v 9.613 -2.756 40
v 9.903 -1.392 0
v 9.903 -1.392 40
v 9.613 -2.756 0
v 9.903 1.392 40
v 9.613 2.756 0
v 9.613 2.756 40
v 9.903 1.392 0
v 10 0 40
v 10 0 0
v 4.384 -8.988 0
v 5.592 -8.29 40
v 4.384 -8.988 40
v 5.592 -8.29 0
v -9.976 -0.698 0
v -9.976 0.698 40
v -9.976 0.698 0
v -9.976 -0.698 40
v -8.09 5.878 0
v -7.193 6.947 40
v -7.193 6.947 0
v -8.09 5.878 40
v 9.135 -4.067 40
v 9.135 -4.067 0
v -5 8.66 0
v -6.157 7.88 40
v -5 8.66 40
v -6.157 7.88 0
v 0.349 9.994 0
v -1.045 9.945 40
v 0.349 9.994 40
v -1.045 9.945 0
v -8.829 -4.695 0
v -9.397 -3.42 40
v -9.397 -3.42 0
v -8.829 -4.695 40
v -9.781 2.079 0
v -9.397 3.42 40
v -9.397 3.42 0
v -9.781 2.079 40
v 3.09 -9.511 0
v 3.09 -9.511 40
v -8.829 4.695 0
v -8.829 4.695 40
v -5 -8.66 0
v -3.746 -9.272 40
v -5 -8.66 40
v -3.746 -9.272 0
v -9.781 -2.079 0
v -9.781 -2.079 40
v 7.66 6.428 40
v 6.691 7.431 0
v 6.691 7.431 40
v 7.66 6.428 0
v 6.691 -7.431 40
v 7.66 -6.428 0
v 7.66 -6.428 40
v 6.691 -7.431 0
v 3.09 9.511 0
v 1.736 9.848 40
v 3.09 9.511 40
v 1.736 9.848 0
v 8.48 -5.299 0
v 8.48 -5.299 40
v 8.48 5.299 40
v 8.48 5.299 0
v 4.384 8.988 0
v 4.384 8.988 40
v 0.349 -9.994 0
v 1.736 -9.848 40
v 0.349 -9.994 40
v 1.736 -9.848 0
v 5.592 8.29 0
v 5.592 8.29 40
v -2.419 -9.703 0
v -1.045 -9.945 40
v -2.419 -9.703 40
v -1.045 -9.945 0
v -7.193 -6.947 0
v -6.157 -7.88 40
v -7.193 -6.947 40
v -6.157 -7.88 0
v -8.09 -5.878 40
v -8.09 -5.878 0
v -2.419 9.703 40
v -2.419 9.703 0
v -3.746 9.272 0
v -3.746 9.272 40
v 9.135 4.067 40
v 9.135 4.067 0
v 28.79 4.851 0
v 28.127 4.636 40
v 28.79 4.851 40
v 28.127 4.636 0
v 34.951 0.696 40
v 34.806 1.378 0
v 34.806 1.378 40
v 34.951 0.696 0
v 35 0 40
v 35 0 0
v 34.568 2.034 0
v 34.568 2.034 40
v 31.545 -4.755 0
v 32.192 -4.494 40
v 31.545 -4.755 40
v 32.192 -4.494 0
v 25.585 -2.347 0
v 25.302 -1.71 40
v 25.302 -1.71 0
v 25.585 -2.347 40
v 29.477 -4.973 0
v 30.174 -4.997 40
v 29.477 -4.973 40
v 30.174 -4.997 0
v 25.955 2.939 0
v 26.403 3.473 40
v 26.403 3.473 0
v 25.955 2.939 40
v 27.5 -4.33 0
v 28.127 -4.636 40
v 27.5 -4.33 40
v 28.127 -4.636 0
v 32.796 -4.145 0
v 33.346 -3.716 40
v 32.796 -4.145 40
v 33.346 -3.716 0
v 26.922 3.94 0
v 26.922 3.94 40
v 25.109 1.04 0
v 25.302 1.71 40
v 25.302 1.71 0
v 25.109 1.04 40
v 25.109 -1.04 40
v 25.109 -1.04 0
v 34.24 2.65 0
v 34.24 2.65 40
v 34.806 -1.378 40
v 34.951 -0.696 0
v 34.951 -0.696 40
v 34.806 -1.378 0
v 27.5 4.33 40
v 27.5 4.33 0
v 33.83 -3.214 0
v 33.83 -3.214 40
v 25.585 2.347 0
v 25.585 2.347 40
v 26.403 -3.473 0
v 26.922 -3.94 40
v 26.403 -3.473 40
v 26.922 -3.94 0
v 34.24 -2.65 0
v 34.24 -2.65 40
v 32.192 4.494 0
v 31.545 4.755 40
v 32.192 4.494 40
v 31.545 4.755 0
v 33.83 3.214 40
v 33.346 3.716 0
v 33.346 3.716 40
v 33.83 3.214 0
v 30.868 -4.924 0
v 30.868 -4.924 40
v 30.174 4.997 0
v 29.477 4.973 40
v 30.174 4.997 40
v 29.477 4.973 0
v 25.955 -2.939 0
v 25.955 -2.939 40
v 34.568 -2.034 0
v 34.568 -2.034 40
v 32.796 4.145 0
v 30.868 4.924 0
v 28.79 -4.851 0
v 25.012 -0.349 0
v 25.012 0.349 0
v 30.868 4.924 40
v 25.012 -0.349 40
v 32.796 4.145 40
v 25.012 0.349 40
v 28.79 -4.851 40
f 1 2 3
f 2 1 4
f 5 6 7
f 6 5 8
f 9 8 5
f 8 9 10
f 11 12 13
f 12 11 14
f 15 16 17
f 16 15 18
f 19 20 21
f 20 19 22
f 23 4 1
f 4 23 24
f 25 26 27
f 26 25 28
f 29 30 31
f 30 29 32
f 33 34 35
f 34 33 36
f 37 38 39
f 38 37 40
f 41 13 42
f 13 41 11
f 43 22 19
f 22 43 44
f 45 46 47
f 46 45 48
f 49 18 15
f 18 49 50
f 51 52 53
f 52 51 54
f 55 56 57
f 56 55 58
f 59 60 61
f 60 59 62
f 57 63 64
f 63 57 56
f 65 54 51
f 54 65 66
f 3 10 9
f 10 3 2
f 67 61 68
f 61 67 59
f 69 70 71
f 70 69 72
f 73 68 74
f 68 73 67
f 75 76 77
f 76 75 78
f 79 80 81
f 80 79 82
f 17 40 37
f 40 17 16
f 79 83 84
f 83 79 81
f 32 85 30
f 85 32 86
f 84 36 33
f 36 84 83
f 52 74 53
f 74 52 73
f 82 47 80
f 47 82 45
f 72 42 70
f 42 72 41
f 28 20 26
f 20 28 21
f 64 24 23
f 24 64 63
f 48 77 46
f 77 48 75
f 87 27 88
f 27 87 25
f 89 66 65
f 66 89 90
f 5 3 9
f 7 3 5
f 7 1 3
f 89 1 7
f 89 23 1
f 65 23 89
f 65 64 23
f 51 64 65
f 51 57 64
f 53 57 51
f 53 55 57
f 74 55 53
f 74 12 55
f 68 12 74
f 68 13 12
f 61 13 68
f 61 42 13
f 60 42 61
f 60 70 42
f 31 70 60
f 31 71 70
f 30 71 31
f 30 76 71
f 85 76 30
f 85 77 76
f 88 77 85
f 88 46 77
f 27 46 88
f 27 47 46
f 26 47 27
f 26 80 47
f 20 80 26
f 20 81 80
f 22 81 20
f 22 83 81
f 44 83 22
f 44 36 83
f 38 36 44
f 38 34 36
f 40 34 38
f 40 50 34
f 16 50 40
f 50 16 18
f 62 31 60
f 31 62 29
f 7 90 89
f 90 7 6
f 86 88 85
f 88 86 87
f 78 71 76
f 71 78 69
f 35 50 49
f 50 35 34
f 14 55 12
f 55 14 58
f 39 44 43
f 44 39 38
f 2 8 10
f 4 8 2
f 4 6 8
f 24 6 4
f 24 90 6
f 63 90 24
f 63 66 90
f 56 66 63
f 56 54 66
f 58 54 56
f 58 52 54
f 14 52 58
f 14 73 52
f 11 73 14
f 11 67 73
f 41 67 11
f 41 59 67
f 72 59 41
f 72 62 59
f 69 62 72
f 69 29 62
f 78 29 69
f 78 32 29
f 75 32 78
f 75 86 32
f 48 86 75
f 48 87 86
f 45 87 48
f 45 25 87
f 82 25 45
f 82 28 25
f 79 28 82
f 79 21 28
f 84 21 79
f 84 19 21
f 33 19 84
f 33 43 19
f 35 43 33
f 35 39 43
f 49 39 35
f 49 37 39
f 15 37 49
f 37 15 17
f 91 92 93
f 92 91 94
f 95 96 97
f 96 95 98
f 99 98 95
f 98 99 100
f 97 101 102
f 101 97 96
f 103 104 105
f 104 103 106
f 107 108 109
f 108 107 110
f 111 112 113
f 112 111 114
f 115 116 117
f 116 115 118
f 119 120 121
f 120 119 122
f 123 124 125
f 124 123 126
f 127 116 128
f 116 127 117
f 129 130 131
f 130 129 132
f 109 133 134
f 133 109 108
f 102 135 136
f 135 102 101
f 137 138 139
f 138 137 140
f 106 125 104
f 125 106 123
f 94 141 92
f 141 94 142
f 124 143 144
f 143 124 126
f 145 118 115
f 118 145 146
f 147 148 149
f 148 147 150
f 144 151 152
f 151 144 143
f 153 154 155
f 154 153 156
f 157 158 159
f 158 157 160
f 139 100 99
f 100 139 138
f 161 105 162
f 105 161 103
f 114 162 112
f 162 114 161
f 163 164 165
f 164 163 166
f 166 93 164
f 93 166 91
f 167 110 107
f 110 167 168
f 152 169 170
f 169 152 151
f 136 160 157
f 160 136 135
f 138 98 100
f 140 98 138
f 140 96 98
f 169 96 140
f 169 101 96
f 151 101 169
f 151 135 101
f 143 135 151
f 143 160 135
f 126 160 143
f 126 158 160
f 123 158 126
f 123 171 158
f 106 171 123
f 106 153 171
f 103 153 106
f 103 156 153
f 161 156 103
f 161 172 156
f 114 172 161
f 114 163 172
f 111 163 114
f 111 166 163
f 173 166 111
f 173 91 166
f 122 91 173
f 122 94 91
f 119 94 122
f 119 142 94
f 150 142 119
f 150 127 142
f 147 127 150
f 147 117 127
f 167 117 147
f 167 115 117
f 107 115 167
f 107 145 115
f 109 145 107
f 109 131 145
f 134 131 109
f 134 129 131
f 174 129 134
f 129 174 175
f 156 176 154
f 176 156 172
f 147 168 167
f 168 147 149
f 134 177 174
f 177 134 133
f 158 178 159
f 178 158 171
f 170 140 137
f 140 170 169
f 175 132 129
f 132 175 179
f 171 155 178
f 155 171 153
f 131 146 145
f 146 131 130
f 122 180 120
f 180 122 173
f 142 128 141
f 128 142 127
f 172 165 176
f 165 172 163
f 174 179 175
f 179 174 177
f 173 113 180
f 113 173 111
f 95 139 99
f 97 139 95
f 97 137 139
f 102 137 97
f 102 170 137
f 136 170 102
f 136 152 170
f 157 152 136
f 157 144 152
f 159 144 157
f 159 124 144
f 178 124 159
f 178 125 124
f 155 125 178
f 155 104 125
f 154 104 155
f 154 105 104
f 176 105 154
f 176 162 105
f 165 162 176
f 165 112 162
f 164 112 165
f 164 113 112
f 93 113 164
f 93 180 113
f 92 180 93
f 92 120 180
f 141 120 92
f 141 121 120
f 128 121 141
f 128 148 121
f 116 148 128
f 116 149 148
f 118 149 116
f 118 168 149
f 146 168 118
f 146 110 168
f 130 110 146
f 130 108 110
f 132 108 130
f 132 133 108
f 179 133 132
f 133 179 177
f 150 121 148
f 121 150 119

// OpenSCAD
$fs=0.1;
$fa=8;
cylinder(r=10,h=40);
translate([30,0,0])cylinder(r=5,h=40);

//screen capture settings
$vpr=[70,0,25];
$vpd=140;
$vpt=[8,15,16];
